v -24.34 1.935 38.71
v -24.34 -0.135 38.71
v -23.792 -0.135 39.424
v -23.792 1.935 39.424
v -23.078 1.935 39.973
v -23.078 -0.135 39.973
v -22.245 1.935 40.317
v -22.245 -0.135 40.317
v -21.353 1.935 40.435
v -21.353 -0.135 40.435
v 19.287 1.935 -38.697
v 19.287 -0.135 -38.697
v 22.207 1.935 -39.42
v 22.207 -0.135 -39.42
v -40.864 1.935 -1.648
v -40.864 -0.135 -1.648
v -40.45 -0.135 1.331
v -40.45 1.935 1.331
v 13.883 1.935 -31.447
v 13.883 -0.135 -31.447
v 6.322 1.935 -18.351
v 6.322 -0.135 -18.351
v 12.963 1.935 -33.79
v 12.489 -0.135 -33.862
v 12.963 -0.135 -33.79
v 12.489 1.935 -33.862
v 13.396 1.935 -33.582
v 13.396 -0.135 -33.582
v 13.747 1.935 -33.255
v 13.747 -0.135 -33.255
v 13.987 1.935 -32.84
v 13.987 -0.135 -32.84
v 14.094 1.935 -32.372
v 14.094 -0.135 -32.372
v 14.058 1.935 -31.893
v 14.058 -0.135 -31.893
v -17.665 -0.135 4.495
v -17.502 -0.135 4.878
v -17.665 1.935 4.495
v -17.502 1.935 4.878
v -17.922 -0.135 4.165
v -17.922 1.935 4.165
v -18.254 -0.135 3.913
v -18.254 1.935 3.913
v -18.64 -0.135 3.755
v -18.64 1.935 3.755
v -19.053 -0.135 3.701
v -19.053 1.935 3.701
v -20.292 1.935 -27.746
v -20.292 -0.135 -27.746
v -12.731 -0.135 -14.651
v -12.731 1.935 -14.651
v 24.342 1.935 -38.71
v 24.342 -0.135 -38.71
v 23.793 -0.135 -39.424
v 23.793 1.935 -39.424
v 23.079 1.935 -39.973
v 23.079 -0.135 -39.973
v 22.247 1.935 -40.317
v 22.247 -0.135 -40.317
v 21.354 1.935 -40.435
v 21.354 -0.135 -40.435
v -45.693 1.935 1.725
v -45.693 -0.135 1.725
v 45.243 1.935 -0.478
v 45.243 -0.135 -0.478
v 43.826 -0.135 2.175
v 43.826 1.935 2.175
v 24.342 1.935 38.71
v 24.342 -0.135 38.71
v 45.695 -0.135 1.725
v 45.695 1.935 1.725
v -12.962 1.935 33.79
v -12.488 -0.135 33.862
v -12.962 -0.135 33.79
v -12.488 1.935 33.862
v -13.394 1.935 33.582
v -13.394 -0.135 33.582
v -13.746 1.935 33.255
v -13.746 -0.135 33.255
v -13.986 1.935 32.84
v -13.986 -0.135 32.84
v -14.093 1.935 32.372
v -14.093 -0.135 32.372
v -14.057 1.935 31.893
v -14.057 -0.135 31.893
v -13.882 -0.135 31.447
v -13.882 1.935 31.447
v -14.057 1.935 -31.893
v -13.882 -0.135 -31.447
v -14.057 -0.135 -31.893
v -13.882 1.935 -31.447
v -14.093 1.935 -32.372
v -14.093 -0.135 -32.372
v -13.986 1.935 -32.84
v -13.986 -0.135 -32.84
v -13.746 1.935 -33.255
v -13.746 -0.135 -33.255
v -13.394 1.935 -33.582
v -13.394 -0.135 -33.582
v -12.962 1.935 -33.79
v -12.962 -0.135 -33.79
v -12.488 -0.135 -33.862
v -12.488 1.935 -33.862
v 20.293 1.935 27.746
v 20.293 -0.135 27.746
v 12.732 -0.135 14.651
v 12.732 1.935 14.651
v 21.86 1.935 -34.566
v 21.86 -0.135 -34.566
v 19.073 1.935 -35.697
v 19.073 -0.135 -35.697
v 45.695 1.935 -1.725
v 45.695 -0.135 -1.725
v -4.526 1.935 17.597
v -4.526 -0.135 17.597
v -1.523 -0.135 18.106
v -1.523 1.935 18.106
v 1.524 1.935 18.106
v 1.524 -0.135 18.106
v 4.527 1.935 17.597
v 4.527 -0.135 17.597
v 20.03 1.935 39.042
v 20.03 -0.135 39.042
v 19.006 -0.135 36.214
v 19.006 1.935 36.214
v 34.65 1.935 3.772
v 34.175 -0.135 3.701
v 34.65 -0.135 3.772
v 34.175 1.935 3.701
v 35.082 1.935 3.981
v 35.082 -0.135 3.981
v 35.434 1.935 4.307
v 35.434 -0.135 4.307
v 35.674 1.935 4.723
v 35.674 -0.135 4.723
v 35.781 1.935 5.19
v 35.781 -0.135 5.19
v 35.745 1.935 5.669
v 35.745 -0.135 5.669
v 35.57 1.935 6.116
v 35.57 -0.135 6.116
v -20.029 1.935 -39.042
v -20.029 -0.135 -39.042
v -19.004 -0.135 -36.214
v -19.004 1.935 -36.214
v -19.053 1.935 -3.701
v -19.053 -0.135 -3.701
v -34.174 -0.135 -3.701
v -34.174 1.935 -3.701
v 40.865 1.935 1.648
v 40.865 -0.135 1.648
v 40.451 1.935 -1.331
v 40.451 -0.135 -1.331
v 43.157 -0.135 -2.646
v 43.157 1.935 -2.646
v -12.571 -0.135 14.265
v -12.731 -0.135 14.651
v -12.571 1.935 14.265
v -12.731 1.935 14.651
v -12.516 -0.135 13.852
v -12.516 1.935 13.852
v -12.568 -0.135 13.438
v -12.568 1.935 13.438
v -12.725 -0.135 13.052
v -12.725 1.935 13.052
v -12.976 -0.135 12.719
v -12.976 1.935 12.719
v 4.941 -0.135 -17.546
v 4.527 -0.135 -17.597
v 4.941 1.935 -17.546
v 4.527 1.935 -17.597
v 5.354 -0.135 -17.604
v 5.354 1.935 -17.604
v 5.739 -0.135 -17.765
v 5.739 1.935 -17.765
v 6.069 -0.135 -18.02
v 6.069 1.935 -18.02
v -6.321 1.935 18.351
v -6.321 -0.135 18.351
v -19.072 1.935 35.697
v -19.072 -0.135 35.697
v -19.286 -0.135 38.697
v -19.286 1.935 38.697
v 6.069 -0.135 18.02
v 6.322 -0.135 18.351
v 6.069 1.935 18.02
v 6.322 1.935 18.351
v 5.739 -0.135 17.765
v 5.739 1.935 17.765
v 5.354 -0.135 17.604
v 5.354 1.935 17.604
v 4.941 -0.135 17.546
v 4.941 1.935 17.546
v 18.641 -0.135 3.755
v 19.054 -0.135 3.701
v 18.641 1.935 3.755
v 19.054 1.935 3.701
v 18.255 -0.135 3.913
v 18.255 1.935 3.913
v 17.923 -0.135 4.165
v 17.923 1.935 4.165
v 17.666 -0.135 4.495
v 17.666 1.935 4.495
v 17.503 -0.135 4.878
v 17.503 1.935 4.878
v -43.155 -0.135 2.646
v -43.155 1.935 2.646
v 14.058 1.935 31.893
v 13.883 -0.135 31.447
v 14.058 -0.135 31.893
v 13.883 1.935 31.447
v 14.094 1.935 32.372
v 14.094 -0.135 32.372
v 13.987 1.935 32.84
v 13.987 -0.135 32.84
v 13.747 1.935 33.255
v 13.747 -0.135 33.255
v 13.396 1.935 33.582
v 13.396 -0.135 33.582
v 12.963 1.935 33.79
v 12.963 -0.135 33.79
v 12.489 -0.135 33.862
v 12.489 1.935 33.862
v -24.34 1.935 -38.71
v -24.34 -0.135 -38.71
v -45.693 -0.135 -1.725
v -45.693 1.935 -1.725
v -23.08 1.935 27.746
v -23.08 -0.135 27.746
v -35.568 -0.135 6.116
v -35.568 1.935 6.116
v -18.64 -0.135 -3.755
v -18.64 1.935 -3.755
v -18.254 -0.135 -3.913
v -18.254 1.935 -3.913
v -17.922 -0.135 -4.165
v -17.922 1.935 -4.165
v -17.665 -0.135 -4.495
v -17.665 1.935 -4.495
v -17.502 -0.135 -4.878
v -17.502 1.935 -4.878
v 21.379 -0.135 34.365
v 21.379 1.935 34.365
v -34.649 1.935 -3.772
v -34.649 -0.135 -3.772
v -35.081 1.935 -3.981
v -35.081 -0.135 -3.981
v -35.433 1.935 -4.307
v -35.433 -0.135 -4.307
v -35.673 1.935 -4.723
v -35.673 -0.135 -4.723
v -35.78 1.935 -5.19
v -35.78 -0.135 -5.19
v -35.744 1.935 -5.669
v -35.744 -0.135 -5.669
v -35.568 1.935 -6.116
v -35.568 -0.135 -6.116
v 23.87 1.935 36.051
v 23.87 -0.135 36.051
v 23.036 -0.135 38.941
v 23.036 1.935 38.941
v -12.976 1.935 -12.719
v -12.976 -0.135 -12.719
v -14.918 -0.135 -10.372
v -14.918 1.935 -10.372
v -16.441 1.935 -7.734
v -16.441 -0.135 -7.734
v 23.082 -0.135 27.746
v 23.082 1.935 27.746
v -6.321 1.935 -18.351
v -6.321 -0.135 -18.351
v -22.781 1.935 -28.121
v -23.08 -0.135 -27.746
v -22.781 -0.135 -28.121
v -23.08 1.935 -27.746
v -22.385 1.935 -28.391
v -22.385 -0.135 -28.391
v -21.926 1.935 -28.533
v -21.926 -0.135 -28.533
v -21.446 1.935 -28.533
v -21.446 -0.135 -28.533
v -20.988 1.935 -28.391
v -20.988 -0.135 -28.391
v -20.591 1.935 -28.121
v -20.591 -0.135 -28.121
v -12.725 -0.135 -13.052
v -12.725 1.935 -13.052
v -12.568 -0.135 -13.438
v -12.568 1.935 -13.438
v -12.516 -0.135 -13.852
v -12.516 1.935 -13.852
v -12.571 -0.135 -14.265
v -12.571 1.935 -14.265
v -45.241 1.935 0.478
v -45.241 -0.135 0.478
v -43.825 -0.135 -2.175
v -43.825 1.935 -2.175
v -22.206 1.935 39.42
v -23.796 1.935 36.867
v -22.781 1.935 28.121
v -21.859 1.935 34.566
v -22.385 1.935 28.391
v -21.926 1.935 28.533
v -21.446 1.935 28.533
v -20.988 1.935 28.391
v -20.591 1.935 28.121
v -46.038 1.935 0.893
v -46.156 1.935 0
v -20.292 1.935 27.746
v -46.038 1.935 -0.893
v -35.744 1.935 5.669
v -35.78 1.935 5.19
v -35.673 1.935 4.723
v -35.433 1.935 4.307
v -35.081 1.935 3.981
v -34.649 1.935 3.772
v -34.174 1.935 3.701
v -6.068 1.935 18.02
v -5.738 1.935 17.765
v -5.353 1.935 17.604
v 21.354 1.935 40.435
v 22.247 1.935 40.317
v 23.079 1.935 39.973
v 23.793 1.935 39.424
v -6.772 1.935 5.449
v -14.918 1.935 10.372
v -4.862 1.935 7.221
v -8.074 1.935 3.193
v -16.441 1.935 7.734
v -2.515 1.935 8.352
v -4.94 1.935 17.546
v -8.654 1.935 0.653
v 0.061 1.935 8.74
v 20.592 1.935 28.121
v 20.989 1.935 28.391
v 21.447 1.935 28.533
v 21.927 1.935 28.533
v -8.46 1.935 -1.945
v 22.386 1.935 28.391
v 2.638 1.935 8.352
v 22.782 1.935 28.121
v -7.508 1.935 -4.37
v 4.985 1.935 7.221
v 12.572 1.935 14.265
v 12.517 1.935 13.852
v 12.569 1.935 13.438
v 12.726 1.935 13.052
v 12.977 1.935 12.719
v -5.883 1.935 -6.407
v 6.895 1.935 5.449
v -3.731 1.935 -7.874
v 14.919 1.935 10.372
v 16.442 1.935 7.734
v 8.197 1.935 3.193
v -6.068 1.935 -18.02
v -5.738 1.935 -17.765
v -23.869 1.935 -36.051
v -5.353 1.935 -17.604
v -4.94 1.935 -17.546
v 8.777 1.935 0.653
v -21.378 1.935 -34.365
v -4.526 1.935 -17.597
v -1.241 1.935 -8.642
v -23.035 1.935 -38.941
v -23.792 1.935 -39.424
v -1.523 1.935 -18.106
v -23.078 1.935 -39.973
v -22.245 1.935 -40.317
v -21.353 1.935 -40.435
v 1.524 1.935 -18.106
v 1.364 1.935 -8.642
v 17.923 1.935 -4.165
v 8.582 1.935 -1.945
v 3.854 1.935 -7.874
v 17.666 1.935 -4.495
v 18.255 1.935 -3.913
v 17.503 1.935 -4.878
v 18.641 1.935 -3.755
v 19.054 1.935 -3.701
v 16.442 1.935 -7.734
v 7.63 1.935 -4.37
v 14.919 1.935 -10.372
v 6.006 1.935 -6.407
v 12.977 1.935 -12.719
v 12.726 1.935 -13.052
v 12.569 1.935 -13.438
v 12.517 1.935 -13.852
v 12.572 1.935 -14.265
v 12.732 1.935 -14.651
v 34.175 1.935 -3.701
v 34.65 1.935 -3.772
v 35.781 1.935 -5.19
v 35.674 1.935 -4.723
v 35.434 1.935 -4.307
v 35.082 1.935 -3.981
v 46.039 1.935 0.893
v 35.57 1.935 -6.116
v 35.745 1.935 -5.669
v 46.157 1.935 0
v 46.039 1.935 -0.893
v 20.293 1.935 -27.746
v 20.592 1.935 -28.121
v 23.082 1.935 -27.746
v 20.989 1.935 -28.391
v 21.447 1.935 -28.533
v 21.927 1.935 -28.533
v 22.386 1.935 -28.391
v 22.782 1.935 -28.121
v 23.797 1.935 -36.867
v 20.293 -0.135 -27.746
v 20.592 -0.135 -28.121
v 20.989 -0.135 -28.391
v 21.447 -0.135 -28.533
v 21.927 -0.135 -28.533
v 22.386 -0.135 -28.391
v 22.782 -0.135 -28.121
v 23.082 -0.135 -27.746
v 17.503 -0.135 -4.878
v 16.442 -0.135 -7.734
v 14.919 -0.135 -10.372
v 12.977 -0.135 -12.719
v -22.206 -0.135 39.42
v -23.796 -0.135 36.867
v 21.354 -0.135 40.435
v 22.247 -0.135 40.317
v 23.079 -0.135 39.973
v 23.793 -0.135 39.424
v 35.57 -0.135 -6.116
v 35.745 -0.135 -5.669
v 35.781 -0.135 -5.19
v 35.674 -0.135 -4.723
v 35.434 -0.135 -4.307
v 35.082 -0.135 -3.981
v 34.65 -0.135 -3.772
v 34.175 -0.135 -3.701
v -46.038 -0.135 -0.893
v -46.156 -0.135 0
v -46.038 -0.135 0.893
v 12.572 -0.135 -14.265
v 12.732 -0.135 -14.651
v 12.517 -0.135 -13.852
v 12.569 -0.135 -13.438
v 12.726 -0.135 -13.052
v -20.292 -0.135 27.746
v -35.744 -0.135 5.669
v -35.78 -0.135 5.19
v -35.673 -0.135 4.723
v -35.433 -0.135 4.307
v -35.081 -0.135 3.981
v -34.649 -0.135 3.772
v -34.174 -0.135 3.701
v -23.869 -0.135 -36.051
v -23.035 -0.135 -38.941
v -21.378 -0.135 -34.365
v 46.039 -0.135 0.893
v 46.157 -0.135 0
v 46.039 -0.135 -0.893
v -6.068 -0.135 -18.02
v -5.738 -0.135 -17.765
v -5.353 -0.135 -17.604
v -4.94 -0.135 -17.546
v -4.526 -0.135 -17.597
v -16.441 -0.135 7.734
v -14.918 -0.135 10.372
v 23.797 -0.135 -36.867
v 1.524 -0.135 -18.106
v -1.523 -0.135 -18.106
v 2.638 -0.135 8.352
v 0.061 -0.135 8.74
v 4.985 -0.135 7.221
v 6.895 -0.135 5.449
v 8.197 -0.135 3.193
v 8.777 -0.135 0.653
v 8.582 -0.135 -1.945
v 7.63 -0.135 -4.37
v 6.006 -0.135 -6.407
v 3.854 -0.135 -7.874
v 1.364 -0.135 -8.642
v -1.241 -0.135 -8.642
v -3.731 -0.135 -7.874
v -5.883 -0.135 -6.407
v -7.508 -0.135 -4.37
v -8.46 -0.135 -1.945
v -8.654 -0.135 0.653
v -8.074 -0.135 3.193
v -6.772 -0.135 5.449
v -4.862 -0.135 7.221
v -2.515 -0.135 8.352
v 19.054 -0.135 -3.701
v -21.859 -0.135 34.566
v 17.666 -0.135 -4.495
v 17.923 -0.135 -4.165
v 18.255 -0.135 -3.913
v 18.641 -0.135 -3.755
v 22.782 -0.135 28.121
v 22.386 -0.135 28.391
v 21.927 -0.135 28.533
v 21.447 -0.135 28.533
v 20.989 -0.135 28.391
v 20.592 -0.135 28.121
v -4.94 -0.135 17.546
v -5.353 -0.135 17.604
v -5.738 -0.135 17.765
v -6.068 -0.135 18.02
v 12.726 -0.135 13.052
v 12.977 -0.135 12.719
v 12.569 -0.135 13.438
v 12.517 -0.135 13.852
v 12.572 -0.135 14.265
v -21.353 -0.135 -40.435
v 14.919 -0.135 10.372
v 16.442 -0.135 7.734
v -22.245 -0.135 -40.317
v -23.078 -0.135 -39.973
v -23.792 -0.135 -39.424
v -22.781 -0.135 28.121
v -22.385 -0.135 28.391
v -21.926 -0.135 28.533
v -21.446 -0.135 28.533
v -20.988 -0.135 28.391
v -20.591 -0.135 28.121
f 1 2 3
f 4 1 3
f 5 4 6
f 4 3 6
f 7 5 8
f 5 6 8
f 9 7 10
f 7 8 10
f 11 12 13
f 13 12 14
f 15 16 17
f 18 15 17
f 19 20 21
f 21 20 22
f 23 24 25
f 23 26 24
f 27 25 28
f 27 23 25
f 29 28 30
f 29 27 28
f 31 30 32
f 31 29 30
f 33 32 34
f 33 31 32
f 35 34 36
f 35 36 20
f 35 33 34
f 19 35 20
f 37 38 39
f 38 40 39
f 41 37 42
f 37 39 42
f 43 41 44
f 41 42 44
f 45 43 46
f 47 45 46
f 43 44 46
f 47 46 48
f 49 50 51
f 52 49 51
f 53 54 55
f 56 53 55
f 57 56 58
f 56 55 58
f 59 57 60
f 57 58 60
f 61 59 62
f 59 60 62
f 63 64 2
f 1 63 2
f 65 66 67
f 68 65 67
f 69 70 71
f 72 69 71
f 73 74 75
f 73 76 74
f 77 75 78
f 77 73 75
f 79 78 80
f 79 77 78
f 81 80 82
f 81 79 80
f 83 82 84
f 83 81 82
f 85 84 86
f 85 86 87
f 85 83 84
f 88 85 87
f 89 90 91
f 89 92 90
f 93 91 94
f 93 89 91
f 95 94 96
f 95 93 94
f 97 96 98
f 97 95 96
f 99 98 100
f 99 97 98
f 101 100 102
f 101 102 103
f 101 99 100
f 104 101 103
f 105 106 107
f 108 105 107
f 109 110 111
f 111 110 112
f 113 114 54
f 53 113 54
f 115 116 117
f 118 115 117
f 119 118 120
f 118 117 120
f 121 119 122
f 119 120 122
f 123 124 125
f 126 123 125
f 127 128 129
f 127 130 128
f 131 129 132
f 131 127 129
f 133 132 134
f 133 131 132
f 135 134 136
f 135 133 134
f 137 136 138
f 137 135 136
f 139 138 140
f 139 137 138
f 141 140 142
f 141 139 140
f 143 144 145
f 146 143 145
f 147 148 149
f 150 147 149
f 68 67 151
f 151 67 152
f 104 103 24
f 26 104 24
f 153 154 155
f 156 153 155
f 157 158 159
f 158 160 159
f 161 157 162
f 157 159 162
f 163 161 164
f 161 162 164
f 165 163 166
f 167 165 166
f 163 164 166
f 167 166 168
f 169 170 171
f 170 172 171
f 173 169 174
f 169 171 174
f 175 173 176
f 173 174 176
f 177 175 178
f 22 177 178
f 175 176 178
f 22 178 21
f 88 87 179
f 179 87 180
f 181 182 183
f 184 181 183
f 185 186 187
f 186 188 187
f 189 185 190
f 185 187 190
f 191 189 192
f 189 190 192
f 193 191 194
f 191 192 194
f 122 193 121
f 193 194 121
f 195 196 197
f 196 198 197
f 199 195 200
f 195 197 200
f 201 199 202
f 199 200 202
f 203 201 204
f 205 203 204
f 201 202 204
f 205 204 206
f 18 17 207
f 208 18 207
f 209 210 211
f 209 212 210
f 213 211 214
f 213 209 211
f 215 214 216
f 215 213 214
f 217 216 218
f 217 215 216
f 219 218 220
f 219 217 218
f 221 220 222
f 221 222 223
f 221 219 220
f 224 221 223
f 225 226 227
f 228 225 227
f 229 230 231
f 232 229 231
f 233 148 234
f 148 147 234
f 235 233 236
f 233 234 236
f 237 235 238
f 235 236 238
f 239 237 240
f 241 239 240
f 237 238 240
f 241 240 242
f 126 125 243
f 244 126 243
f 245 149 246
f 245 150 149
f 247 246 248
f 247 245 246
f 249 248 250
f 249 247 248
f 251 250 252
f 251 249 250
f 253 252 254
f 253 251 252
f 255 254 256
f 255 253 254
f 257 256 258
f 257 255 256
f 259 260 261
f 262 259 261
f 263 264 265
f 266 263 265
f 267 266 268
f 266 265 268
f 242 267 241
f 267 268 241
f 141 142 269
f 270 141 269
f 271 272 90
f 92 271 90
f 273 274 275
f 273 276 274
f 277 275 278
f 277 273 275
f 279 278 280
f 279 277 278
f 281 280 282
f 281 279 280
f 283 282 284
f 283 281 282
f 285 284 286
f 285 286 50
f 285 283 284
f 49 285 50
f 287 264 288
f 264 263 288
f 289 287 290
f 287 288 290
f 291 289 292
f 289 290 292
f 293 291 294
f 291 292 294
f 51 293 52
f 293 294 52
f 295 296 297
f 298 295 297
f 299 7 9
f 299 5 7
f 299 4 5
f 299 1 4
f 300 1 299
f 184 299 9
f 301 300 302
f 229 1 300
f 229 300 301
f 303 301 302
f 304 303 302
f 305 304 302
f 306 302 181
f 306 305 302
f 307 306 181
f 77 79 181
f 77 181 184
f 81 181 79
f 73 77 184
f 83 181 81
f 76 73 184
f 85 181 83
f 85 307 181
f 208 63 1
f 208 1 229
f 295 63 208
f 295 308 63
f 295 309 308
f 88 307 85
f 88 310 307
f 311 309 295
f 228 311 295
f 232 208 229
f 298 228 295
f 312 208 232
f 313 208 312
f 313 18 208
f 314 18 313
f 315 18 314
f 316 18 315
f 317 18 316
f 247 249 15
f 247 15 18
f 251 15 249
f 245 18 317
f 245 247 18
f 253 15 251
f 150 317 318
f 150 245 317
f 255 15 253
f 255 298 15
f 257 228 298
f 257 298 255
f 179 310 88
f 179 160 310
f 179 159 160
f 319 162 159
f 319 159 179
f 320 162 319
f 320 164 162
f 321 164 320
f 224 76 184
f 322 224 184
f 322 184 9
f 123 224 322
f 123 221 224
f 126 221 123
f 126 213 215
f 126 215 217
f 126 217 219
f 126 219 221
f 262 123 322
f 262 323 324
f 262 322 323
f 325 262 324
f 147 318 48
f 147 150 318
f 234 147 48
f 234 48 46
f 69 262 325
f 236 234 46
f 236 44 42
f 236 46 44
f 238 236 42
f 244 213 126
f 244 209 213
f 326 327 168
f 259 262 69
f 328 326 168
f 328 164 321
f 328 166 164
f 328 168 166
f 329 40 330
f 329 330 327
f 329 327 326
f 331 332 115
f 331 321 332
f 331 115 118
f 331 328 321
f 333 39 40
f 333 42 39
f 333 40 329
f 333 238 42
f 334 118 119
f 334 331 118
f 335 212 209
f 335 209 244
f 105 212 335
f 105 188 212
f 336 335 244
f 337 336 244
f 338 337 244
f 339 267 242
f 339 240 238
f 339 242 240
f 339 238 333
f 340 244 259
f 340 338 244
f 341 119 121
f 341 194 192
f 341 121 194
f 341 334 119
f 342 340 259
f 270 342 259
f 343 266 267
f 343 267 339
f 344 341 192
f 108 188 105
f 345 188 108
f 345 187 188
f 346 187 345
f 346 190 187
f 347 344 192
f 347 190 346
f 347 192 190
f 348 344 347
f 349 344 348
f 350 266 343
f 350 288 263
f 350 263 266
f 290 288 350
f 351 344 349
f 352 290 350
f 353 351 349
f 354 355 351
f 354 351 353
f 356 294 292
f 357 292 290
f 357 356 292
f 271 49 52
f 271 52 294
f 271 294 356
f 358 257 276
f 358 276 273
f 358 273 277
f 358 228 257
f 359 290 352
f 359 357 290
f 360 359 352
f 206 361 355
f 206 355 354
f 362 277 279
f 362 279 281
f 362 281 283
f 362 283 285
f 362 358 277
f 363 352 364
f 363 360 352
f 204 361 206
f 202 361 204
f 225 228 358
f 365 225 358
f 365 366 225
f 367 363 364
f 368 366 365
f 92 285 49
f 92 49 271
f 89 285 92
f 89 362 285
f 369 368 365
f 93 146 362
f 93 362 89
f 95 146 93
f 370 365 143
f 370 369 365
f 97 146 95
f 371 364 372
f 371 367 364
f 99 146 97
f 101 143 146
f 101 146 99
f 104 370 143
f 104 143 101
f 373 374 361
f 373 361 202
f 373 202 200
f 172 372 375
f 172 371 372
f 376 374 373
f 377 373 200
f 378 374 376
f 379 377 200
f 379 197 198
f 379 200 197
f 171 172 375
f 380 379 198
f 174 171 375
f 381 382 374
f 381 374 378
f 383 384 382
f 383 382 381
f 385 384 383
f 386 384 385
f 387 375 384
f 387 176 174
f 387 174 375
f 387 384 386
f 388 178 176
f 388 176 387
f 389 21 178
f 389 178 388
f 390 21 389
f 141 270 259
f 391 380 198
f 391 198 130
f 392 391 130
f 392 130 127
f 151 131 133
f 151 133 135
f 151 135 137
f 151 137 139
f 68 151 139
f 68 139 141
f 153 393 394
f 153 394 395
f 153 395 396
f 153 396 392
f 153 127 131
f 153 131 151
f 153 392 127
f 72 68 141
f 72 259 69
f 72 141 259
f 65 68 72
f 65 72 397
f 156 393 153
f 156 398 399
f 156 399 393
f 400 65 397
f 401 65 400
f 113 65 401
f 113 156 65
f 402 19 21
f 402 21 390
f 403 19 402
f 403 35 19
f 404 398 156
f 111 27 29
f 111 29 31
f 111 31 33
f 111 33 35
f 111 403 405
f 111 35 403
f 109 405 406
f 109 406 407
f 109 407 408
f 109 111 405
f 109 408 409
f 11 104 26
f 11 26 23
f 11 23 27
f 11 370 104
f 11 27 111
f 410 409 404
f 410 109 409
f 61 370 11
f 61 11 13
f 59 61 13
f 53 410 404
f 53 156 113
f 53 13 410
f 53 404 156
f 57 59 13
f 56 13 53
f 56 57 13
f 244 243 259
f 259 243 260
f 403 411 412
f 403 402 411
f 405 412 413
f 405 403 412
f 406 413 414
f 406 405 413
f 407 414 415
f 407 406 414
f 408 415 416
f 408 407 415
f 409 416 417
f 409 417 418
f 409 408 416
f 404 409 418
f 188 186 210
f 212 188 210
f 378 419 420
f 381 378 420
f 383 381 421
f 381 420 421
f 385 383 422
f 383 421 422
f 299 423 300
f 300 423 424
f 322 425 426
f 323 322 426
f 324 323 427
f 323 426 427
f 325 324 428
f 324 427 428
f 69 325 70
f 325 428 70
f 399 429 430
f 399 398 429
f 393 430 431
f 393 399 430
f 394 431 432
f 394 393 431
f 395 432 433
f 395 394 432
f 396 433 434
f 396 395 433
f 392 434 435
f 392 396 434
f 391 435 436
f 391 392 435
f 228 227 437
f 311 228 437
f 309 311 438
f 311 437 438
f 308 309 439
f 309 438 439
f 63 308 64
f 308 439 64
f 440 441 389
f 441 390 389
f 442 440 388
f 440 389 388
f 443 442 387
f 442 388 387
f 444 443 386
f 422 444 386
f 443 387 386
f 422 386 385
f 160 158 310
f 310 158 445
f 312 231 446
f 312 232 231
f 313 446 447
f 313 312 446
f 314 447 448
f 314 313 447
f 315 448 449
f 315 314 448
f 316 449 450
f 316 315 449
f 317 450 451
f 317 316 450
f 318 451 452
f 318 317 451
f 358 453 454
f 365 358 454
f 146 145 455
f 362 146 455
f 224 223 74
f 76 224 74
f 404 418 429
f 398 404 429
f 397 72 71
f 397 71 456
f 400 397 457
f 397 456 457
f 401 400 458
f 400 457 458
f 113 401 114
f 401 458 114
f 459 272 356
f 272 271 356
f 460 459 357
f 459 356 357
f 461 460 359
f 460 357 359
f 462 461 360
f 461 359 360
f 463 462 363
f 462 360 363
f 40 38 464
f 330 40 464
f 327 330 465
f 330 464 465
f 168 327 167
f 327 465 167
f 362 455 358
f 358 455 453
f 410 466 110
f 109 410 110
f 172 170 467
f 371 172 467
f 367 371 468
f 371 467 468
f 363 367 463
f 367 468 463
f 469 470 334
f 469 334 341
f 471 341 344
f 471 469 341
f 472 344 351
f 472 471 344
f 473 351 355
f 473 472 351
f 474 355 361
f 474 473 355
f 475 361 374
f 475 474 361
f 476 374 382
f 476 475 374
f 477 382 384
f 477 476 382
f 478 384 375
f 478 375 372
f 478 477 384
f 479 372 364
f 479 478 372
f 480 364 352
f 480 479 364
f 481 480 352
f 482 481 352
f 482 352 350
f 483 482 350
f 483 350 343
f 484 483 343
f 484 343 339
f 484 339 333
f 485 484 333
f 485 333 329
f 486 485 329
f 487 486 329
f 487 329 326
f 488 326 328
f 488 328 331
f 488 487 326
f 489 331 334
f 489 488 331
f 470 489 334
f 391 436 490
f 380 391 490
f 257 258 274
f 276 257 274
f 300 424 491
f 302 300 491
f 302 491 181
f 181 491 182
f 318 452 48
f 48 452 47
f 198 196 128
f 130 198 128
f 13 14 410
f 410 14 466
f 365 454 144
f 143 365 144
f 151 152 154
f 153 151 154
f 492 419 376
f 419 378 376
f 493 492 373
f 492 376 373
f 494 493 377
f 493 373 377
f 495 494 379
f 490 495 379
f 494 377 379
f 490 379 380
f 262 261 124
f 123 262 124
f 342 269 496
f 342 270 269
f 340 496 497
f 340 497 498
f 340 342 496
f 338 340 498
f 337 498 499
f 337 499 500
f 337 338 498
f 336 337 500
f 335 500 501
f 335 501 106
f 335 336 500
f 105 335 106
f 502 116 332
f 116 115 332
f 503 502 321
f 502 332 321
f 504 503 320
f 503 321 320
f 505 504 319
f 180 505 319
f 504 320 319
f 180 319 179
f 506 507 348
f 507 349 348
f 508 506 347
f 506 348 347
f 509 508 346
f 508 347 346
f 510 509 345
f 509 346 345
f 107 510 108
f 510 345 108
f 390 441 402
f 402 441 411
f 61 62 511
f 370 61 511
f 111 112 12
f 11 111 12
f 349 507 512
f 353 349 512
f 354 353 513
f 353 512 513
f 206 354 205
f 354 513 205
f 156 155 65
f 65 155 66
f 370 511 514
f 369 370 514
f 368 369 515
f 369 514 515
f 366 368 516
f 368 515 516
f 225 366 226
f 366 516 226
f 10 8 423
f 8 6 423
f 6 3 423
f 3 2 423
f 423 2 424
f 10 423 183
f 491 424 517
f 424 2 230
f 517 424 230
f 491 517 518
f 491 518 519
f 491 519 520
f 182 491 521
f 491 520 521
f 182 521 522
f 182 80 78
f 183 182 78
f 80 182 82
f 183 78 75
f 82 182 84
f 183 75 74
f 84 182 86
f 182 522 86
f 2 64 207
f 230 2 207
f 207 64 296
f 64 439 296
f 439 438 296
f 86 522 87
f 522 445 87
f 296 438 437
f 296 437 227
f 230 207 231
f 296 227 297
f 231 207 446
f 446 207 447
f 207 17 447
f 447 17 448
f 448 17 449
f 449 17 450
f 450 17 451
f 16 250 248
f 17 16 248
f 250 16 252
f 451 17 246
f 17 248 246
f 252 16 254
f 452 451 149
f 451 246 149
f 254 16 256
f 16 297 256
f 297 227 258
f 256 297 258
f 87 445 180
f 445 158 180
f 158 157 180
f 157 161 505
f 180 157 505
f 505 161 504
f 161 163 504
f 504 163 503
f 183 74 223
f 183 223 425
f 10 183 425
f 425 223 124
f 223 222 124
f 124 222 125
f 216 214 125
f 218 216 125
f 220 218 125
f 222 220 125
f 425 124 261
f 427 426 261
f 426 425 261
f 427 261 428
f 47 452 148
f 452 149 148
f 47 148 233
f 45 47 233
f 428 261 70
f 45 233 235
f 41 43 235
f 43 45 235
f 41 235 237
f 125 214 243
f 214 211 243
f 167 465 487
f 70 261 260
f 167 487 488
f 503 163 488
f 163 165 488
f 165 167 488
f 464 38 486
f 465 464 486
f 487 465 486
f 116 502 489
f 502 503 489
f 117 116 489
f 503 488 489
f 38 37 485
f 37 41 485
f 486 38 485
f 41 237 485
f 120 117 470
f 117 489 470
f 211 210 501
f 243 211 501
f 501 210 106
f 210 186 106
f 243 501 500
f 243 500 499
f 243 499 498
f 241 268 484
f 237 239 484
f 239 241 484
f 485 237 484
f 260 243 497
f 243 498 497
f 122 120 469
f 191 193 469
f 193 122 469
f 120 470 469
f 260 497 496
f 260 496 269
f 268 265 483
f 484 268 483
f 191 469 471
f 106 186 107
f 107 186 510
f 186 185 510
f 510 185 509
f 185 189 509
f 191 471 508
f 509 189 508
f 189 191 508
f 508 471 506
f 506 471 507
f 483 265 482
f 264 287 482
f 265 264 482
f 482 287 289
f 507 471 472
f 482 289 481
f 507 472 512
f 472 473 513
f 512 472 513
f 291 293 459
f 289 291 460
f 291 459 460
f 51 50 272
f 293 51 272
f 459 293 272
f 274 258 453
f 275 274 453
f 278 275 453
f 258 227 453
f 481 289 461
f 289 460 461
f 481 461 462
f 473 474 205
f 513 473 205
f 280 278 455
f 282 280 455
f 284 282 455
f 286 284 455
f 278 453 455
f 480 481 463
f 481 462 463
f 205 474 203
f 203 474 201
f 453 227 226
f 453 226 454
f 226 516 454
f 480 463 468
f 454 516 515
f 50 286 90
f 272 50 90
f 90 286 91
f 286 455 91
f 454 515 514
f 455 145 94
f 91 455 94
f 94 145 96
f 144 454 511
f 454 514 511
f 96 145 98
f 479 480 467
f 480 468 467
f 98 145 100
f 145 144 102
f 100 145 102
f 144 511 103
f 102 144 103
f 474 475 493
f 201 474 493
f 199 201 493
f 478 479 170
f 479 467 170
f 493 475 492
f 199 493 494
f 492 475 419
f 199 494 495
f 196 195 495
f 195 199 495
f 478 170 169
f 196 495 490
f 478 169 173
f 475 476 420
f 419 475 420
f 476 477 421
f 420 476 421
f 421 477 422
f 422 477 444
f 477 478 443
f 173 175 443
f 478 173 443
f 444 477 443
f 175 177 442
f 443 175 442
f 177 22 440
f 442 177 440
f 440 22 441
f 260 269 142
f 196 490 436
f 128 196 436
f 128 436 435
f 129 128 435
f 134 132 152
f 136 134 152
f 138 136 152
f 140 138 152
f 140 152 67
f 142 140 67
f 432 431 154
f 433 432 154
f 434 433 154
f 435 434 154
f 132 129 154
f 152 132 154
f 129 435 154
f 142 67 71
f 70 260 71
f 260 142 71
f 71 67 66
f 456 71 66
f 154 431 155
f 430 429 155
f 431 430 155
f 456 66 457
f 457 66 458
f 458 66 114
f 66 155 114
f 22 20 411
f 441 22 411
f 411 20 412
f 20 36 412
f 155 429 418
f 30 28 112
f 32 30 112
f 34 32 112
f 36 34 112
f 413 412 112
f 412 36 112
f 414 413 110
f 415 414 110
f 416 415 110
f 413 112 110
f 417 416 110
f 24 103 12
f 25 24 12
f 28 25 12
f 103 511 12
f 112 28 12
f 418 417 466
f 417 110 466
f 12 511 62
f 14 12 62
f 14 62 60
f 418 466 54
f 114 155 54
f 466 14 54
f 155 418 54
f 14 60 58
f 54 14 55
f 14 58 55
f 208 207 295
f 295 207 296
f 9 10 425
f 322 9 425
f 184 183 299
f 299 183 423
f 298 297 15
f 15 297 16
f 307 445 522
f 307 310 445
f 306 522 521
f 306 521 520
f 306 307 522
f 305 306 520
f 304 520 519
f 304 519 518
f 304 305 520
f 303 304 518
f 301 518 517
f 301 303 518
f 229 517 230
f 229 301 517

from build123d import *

# Parameters (mm, degrees)
SKETCH1_R           = 7.6
BOSS_EXTRUDE1_DEPTH = 1.8
FILLET1_R           = 3
FILLET2_R           = 1.4
SCALE1_SCALE        = 1.15


with BuildPart() as part:
    # Sketch1 → Boss-Extrude1 (new body)
    with BuildSketch(Plane(origin=(0, 0, 0), x_dir=(1, 0, 0), z_dir=(0, 1, 0))):
        Polygon((20.3, 35.160631394), (-20.3, 35.160631394), (-40.6, 0), (-20.3, -35.160631394), (20.3, -35.160631394), (40.6, 0), align=None)
        Polygon((-16.584596387, -31.040676977), (-16.771232891, -33.649562724), (-19.310104532, -34.278250893), (-20.692576995, -32.057915803), (-19.008120326, -30.056985082), align=None, mode=Mode.SUBTRACT)
        Polygon((-35.174313007, -1.157656706), (-37.526992591, -2.300467626), (-39.340888337, -0.416084372), (-38.109257976, 1.891339446), (-35.534172805, 1.433022539), align=None, mode=Mode.SUBTRACT)
        Polygon((18.589716619, -29.883020272), (20.7557597, -31.349095098), (20.030783805, -33.862166521), (17.41668098, -33.94925525), (16.52605248, -31.490007621), align=None, mode=Mode.SUBTRACT)
        with BuildLine():
            Line((-32.142053523, 3.218057696), (-18.857946477, 26.226806032))
            Line((-18.857946477, 26.226806032), (-10.521325069, 11.78735419))
            ThreePointArc((-10.521325069, 11.78735419), (-13.68320138, 7.9), (-15.468810706, 3.218057696))
            Line((-15.468810706, 3.218057696), (-32.142053523, 3.218057696))
        make_face(mode=Mode.SUBTRACT)
        with BuildLine():
            Line((-18.857946477, -26.226806032), (-32.142053523, -3.218057696))
            Line((-32.142053523, -3.218057696), (-15.468810706, -3.218057696))
            ThreePointArc((-15.468810706, -3.218057696), (-13.68320138, -7.9), (-10.521325069, -11.78735419))
            Line((-10.521325069, -11.78735419), (-18.857946477, -26.226806032))
        make_face(mode=Mode.SUBTRACT)
        with BuildLine():
            Line((13.284107046, -29.444863729), (-13.284107046, -29.444863729))
            Line((-13.284107046, -29.444863729), (-4.947485637, -15.005411886))
            ThreePointArc((-4.947485637, -15.005411886), (0, -15.8), (4.947485637, -15.005411886))
            Line((4.947485637, -15.005411886), (13.284107046, -29.444863729))
        make_face(mode=Mode.SUBTRACT)
        with BuildLine():
            Line((32.142053523, -3.218057696), (18.857946477, -26.226806032))
            Line((18.857946477, -26.226806032), (10.521325069, -11.78735419))
            ThreePointArc((10.521325069, -11.78735419), (13.68320138, -7.9), (15.468810706, -3.218057696))
            Line((15.468810706, -3.218057696), (32.142053523, -3.218057696))
        make_face(mode=Mode.SUBTRACT)
        with BuildLine():
            Line((18.857946477, 26.226806032), (32.142053523, 3.218057696))
            Line((32.142053523, 3.218057696), (15.468810706, 3.218057696))
            ThreePointArc((15.468810706, 3.218057696), (13.68320138, 7.9), (10.521325069, 11.78735419))
            Line((10.521325069, 11.78735419), (18.857946477, 26.226806032))
        make_face(mode=Mode.SUBTRACT)
        with BuildLine():
            Line((-13.284107046, 29.444863729), (13.284107046, 29.444863729))
            Line((13.284107046, 29.444863729), (4.947485637, 15.005411886))
            ThreePointArc((4.947485637, 15.005411886), (0, 15.8), (-4.947485637, 15.005411886))
            Line((-4.947485637, 15.005411886), (-13.284107046, 29.444863729))
        make_face(mode=Mode.SUBTRACT)
        Polygon((-18.589716619, 29.883020272), (-20.7557597, 31.349095098), (-20.030783805, 33.862166521), (-17.41668098, 33.94925525), (-16.52605248, 31.490007621), align=None, mode=Mode.SUBTRACT)
        Polygon((35.174313007, 1.157656706), (37.526992591, 2.300467626), (39.340888337, 0.416084372), (38.109257976, -1.891339446), (35.534172805, -1.433022539), align=None, mode=Mode.SUBTRACT)
        Polygon((16.584596387, 31.040676977), (16.771232891, 33.649562724), (19.310104532, 34.278250893), (20.692576995, 32.057915803), (19.008120326, 30.056985082), align=None, mode=Mode.SUBTRACT)
        with Locations(Location((0.052857117, 0, 0), (0, 0, 270))):
            Circle(SKETCH1_R, mode=Mode.SUBTRACT)
    extrude(amount=BOSS_EXTRUDE1_DEPTH)

    # Fillet1
    # the kernel refuses this fillet: 3 mm, written as the material it takes off along each edge
    with BuildSketch(Plane(origin=(40.6, -4.330127019, 0), x_dir=(-0.4999999999998131, 0, -0.8660254037845465), z_dir=(0, 1, 0))) as fillet1_piece_1:
        with BuildLine():
            CenterArc((FILLET1_R * 0.577350269186, FILLET1_R), FILLET1_R, 210, 60)
            Line((-FILLET1_R * 0.288675134596, FILLET1_R * 0.499999999995), (0, 0))
            Line((0, 0), (FILLET1_R * 0.577350269186, 0))
        make_face()
    extrude(amount=10.460254038, mode=Mode.SUBTRACT)
    with BuildSketch(Plane(origin=(20.3, -4.330127019, 35.160631394), x_dir=(-1.0, 0, -2.4203690345734148e-12), z_dir=(0, 1, 0)), Plane(origin=(-20.3, -4.330127019, 35.160631394), x_dir=(-0.5000000000021431, 0, -0.8660254037832013), z_dir=(0, 1, 0)), Plane(origin=(-40.6, -4.330127019, 0), x_dir=(0.49999999999780936, 0, -0.8660254037857034), z_dir=(0, 1, 0)), Plane(origin=(-20.3, -4.330127019, -35.160631394), x_dir=(1, 0, 0), z_dir=(0, 1, 0)), Plane(origin=(20.3, -4.330127019, -35.160631394), x_dir=(0.49999999999981115, 0, 0.8660254037845477), z_dir=(0, 1, 0))) as fillet1_piece_2:
        with BuildLine():
            CenterArc((FILLET1_R * 0.577350269195, -FILLET1_R), FILLET1_R, 90, 60)
            Line((-FILLET1_R * 0.288675134594, -FILLET1_R * 0.500000000007), (0, 0))
            Line((0, 0), (FILLET1_R * 0.577350269195, 0))
        make_face()
    extrude(amount=10.460254038, mode=Mode.SUBTRACT)

    # Fillet2
    fillet2_edges = [part.edges().sort_by_distance(p)[0] for p in [
        (-32.142053523, 0.9, -3.218057696),
        (-15.468810706, 0.9, -3.218057696),
        (-10.521325069, 0.9, -11.78735419),
        (-18.857946477, 0.9, -26.226806032),
        (-18.857946477, 0.9, 26.226806032),
        (-10.521325069, 0.9, 11.78735419),
        (-15.468810706, 0.9, 3.218057696),
        (-32.142053523, 0.9, 3.218057696),
        (13.284107046, 0.9, 29.444863729),
        (4.947485637, 0.9, 15.005411886),
        (-4.947485637, 0.9, 15.005411886),
        (-13.284107046, 0.9, 29.444863729),
        (32.142053523, 0.9, 3.218057696),
        (15.468810706, 0.9, 3.218057696),
        (10.521325069, 0.9, 11.78735419),
        (18.857946477, 0.9, 26.226806032),
        (18.857946477, 0.9, -26.226806032),
        (10.521325069, 0.9, -11.78735419),
        (15.468810706, 0.9, -3.218057696),
        (32.142053523, 0.9, -3.218057696),
        (-13.284107046, 0.9, -29.444863729),
        (-4.947485637, 0.9, -15.005411886),
        (4.947485637, 0.9, -15.005411886),
        (13.284107046, 0.9, -29.444863729),
    ]]
    fillet(fillet2_edges, radius=FILLET2_R)


with BuildPart() as part_1:
    # Scale1: scaled about (-0.00383883, 0.9, 0)
    add(part.part.scale(SCALE1_SCALE).moved(Location((0.000575824, -0.135, 0))))


solid = part_1.part
